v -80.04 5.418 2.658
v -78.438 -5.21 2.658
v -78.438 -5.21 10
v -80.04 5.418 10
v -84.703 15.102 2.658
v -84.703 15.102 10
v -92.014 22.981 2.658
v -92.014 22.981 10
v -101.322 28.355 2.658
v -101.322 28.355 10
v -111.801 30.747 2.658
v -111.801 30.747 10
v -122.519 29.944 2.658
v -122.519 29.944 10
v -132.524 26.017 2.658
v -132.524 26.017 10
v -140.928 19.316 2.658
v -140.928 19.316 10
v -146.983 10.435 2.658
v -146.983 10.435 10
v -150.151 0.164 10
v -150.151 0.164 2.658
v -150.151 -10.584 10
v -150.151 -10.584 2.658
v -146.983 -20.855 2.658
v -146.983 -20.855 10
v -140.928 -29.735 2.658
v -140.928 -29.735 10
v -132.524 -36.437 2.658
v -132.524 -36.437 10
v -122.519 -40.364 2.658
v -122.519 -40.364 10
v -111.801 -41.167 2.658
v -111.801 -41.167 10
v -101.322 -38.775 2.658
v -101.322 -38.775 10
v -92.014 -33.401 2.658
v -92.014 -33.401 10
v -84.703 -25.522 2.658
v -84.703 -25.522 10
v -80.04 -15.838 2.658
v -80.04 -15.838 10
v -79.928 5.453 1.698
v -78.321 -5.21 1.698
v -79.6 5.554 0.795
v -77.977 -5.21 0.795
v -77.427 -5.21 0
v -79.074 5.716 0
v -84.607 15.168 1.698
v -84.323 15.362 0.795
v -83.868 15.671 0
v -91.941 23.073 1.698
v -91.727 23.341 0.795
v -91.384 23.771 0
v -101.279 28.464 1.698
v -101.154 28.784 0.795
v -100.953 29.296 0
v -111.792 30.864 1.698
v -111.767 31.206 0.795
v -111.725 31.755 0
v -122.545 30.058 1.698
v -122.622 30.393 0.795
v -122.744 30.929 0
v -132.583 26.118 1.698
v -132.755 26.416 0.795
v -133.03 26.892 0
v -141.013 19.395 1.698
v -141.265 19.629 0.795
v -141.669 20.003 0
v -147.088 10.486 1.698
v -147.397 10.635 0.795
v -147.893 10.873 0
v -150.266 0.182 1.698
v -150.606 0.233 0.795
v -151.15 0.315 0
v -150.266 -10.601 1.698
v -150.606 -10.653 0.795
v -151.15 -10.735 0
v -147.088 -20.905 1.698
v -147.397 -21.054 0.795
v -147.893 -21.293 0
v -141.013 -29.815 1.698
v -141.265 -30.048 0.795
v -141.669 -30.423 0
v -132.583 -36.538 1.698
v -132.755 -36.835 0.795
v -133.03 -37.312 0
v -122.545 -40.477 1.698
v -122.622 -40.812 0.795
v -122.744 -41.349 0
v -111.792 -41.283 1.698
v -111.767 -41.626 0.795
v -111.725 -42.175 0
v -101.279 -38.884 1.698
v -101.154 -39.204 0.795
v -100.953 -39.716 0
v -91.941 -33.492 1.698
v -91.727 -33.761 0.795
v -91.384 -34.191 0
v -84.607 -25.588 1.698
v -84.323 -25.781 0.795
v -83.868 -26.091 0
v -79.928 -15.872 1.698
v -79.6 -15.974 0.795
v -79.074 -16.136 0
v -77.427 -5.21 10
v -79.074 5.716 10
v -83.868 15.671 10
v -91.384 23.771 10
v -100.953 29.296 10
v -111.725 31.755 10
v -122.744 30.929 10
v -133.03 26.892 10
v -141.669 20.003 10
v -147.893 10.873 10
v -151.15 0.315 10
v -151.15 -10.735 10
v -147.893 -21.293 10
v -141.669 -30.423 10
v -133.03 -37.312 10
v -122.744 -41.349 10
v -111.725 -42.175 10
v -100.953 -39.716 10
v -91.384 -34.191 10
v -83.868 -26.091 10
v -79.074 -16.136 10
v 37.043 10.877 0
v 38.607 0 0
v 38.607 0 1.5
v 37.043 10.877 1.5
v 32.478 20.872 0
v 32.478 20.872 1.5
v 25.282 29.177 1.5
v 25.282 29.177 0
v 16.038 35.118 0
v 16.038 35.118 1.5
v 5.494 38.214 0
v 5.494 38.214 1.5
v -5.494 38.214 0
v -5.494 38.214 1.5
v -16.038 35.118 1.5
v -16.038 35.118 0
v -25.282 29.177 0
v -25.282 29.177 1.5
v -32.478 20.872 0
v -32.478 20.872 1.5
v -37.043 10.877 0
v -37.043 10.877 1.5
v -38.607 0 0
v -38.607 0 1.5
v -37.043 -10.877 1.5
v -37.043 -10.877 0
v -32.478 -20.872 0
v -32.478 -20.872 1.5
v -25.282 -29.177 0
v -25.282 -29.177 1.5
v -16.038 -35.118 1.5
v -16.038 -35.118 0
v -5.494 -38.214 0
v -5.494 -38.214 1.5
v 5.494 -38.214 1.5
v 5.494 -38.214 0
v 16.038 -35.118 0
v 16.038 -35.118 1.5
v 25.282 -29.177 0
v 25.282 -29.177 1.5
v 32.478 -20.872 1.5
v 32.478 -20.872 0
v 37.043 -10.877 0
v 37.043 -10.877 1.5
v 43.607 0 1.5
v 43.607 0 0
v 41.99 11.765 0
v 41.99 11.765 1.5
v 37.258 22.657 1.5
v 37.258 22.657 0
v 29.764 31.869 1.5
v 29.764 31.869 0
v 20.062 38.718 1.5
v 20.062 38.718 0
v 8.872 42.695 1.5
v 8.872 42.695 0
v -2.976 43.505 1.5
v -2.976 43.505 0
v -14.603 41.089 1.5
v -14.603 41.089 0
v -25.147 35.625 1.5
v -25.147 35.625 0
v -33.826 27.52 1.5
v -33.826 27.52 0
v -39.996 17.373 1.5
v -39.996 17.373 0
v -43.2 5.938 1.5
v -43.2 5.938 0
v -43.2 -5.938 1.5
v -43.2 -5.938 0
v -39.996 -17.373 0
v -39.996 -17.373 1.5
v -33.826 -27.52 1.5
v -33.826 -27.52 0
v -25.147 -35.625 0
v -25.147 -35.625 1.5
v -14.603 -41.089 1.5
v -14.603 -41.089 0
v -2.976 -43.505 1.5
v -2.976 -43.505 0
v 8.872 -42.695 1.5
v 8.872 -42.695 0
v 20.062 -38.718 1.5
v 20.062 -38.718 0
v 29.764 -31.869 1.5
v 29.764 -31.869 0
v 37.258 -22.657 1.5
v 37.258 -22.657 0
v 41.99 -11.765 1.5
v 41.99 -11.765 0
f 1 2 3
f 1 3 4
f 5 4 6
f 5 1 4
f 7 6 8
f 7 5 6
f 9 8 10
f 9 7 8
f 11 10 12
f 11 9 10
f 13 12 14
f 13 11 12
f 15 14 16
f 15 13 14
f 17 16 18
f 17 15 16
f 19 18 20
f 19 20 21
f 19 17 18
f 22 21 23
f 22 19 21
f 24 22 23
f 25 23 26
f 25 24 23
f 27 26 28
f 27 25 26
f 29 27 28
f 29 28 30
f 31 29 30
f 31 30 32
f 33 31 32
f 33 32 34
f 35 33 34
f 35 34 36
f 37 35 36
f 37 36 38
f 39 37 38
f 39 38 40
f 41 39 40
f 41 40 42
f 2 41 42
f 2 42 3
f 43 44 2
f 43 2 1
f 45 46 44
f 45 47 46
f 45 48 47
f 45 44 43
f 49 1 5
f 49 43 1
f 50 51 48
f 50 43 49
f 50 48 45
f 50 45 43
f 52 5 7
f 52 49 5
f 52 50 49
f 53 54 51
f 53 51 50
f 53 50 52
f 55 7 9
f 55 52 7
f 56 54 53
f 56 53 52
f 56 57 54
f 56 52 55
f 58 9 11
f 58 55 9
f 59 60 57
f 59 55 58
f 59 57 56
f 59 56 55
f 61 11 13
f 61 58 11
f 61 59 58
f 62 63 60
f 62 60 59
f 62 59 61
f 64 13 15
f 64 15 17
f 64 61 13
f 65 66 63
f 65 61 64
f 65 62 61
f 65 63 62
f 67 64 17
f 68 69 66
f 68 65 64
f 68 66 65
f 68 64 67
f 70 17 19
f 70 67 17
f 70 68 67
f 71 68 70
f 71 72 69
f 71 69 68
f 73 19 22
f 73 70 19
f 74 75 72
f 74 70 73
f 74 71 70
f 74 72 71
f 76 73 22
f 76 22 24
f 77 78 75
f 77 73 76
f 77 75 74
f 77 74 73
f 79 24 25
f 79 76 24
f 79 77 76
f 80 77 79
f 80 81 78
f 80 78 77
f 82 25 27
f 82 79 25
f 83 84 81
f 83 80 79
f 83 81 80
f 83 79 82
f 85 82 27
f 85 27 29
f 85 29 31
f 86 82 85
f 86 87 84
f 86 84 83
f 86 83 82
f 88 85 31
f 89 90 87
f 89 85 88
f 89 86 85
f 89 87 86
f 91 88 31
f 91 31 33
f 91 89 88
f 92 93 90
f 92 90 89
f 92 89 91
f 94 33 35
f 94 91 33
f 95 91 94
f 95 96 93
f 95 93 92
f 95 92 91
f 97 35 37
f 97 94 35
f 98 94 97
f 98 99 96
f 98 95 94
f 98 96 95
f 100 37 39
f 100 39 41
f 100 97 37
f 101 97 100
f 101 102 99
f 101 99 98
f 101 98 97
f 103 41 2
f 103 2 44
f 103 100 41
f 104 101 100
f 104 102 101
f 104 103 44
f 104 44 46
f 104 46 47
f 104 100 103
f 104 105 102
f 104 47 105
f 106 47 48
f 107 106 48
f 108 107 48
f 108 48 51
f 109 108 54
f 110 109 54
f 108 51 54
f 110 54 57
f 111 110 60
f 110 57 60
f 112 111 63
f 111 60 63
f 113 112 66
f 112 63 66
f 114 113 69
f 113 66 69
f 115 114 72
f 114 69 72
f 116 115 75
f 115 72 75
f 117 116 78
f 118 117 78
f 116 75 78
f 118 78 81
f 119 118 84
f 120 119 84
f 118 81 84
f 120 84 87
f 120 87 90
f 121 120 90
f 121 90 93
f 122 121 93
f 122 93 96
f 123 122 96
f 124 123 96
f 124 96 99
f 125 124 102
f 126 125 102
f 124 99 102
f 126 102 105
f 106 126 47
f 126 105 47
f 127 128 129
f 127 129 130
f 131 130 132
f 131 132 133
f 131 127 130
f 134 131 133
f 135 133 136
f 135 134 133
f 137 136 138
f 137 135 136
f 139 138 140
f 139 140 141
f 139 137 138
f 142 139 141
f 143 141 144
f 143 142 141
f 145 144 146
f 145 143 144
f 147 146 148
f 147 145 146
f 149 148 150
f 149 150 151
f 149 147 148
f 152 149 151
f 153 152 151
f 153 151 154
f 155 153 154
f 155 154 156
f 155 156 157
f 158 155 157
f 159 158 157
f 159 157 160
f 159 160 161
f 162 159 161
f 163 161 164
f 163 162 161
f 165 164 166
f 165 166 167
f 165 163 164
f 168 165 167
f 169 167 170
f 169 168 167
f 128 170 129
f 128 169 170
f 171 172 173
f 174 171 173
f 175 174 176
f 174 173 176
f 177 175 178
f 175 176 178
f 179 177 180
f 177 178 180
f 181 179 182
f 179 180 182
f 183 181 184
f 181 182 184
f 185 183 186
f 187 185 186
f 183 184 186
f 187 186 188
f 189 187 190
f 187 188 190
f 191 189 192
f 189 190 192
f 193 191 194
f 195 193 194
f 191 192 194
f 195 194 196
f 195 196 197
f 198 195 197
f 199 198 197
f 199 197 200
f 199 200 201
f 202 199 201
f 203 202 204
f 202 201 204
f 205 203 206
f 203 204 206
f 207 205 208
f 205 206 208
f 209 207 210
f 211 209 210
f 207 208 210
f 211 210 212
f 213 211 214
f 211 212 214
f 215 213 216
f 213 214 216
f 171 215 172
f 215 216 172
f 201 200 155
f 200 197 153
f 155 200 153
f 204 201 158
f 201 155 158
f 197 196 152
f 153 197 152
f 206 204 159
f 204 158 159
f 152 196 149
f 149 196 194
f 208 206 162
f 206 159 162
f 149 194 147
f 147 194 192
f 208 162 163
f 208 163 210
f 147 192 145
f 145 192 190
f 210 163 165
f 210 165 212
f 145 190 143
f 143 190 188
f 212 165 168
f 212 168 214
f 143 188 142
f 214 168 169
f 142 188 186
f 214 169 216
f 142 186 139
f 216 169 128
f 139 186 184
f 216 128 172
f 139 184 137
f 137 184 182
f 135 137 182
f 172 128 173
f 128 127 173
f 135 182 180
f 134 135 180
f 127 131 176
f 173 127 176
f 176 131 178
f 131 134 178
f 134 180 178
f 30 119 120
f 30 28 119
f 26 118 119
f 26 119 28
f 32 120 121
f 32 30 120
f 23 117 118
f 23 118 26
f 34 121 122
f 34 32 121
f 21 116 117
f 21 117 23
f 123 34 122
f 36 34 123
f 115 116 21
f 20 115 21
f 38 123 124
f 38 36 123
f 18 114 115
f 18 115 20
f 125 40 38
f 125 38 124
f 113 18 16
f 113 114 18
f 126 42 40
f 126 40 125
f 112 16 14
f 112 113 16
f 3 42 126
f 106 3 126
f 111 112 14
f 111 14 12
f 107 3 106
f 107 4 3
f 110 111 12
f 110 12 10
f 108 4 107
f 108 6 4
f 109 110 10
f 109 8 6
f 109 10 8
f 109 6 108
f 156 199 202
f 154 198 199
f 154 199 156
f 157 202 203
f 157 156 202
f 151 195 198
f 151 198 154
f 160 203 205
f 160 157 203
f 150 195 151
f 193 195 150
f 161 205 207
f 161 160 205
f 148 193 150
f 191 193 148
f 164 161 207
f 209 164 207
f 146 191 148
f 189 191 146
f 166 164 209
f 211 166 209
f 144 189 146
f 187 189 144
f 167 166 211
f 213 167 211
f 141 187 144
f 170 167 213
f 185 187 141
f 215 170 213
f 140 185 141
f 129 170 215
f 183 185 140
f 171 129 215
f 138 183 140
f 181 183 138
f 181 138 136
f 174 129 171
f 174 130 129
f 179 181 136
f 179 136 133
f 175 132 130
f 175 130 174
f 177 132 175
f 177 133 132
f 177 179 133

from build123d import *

# Parameters (mm, degrees)
F1_R     = 43.6066034391
F1_R_2   = 38.6066034391
F2_DEPTH = 1.5
F0_R     = 37.0683102398
F0_R_2   = 36.0578095469
F3_DEPTH = 10


# Not quite as in the source:
# - a fillet or chamfer that OpenCascade refuses, or shapes differently, is made with other operations: its cross-section is extruded or revolved along the edge and cut away or added
# - a feature names something its author has since deleted; it is built from what else it names


with BuildPart() as f2:
    # F1 (on Top) → F2 (new body)
    with BuildSketch(Plane.XY):
        Circle(F1_R)
        Circle(F1_R_2, mode=Mode.SUBTRACT)
    extrude(amount=F2_DEPTH)


with BuildPart() as f3:
    # F0 (on Top) → F3 (new body)
    with BuildSketch(Plane.XY):
        with Locations((-114.4955381751, -5.2098422311)):
            Circle(F0_R)
        with Locations((-114.4955381751, -5.2098422311)):
            Circle(F0_R_2, mode=Mode.SUBTRACT)
    extrude(amount=F3_DEPTH)

    # F5: fillet of radius 4 on 1 edges, made by hand

    # F5_s1 → F5_t2 (revolve, cut)
    with BuildSketch(Plane.XZ.offset(5.2098422311)):
        with BuildLine():
            ThreePointArc((-78.4377286282, 2.6576105607), (-78.1765785335, 1.2359912778), (-77.4272279353, 0))
            Line((-77.4272279353, 0), (-78.4377286282, 0))
            Line((-78.4377286282, 0), (-78.4377286282, 2.6576105607))
        make_face()
    revolve(axis=Axis((-114.4955381751, -5.2098422311, 0), (0, 0, 1)), mode=Mode.SUBTRACT)


solid = Compound([f2.part, f3.part])
